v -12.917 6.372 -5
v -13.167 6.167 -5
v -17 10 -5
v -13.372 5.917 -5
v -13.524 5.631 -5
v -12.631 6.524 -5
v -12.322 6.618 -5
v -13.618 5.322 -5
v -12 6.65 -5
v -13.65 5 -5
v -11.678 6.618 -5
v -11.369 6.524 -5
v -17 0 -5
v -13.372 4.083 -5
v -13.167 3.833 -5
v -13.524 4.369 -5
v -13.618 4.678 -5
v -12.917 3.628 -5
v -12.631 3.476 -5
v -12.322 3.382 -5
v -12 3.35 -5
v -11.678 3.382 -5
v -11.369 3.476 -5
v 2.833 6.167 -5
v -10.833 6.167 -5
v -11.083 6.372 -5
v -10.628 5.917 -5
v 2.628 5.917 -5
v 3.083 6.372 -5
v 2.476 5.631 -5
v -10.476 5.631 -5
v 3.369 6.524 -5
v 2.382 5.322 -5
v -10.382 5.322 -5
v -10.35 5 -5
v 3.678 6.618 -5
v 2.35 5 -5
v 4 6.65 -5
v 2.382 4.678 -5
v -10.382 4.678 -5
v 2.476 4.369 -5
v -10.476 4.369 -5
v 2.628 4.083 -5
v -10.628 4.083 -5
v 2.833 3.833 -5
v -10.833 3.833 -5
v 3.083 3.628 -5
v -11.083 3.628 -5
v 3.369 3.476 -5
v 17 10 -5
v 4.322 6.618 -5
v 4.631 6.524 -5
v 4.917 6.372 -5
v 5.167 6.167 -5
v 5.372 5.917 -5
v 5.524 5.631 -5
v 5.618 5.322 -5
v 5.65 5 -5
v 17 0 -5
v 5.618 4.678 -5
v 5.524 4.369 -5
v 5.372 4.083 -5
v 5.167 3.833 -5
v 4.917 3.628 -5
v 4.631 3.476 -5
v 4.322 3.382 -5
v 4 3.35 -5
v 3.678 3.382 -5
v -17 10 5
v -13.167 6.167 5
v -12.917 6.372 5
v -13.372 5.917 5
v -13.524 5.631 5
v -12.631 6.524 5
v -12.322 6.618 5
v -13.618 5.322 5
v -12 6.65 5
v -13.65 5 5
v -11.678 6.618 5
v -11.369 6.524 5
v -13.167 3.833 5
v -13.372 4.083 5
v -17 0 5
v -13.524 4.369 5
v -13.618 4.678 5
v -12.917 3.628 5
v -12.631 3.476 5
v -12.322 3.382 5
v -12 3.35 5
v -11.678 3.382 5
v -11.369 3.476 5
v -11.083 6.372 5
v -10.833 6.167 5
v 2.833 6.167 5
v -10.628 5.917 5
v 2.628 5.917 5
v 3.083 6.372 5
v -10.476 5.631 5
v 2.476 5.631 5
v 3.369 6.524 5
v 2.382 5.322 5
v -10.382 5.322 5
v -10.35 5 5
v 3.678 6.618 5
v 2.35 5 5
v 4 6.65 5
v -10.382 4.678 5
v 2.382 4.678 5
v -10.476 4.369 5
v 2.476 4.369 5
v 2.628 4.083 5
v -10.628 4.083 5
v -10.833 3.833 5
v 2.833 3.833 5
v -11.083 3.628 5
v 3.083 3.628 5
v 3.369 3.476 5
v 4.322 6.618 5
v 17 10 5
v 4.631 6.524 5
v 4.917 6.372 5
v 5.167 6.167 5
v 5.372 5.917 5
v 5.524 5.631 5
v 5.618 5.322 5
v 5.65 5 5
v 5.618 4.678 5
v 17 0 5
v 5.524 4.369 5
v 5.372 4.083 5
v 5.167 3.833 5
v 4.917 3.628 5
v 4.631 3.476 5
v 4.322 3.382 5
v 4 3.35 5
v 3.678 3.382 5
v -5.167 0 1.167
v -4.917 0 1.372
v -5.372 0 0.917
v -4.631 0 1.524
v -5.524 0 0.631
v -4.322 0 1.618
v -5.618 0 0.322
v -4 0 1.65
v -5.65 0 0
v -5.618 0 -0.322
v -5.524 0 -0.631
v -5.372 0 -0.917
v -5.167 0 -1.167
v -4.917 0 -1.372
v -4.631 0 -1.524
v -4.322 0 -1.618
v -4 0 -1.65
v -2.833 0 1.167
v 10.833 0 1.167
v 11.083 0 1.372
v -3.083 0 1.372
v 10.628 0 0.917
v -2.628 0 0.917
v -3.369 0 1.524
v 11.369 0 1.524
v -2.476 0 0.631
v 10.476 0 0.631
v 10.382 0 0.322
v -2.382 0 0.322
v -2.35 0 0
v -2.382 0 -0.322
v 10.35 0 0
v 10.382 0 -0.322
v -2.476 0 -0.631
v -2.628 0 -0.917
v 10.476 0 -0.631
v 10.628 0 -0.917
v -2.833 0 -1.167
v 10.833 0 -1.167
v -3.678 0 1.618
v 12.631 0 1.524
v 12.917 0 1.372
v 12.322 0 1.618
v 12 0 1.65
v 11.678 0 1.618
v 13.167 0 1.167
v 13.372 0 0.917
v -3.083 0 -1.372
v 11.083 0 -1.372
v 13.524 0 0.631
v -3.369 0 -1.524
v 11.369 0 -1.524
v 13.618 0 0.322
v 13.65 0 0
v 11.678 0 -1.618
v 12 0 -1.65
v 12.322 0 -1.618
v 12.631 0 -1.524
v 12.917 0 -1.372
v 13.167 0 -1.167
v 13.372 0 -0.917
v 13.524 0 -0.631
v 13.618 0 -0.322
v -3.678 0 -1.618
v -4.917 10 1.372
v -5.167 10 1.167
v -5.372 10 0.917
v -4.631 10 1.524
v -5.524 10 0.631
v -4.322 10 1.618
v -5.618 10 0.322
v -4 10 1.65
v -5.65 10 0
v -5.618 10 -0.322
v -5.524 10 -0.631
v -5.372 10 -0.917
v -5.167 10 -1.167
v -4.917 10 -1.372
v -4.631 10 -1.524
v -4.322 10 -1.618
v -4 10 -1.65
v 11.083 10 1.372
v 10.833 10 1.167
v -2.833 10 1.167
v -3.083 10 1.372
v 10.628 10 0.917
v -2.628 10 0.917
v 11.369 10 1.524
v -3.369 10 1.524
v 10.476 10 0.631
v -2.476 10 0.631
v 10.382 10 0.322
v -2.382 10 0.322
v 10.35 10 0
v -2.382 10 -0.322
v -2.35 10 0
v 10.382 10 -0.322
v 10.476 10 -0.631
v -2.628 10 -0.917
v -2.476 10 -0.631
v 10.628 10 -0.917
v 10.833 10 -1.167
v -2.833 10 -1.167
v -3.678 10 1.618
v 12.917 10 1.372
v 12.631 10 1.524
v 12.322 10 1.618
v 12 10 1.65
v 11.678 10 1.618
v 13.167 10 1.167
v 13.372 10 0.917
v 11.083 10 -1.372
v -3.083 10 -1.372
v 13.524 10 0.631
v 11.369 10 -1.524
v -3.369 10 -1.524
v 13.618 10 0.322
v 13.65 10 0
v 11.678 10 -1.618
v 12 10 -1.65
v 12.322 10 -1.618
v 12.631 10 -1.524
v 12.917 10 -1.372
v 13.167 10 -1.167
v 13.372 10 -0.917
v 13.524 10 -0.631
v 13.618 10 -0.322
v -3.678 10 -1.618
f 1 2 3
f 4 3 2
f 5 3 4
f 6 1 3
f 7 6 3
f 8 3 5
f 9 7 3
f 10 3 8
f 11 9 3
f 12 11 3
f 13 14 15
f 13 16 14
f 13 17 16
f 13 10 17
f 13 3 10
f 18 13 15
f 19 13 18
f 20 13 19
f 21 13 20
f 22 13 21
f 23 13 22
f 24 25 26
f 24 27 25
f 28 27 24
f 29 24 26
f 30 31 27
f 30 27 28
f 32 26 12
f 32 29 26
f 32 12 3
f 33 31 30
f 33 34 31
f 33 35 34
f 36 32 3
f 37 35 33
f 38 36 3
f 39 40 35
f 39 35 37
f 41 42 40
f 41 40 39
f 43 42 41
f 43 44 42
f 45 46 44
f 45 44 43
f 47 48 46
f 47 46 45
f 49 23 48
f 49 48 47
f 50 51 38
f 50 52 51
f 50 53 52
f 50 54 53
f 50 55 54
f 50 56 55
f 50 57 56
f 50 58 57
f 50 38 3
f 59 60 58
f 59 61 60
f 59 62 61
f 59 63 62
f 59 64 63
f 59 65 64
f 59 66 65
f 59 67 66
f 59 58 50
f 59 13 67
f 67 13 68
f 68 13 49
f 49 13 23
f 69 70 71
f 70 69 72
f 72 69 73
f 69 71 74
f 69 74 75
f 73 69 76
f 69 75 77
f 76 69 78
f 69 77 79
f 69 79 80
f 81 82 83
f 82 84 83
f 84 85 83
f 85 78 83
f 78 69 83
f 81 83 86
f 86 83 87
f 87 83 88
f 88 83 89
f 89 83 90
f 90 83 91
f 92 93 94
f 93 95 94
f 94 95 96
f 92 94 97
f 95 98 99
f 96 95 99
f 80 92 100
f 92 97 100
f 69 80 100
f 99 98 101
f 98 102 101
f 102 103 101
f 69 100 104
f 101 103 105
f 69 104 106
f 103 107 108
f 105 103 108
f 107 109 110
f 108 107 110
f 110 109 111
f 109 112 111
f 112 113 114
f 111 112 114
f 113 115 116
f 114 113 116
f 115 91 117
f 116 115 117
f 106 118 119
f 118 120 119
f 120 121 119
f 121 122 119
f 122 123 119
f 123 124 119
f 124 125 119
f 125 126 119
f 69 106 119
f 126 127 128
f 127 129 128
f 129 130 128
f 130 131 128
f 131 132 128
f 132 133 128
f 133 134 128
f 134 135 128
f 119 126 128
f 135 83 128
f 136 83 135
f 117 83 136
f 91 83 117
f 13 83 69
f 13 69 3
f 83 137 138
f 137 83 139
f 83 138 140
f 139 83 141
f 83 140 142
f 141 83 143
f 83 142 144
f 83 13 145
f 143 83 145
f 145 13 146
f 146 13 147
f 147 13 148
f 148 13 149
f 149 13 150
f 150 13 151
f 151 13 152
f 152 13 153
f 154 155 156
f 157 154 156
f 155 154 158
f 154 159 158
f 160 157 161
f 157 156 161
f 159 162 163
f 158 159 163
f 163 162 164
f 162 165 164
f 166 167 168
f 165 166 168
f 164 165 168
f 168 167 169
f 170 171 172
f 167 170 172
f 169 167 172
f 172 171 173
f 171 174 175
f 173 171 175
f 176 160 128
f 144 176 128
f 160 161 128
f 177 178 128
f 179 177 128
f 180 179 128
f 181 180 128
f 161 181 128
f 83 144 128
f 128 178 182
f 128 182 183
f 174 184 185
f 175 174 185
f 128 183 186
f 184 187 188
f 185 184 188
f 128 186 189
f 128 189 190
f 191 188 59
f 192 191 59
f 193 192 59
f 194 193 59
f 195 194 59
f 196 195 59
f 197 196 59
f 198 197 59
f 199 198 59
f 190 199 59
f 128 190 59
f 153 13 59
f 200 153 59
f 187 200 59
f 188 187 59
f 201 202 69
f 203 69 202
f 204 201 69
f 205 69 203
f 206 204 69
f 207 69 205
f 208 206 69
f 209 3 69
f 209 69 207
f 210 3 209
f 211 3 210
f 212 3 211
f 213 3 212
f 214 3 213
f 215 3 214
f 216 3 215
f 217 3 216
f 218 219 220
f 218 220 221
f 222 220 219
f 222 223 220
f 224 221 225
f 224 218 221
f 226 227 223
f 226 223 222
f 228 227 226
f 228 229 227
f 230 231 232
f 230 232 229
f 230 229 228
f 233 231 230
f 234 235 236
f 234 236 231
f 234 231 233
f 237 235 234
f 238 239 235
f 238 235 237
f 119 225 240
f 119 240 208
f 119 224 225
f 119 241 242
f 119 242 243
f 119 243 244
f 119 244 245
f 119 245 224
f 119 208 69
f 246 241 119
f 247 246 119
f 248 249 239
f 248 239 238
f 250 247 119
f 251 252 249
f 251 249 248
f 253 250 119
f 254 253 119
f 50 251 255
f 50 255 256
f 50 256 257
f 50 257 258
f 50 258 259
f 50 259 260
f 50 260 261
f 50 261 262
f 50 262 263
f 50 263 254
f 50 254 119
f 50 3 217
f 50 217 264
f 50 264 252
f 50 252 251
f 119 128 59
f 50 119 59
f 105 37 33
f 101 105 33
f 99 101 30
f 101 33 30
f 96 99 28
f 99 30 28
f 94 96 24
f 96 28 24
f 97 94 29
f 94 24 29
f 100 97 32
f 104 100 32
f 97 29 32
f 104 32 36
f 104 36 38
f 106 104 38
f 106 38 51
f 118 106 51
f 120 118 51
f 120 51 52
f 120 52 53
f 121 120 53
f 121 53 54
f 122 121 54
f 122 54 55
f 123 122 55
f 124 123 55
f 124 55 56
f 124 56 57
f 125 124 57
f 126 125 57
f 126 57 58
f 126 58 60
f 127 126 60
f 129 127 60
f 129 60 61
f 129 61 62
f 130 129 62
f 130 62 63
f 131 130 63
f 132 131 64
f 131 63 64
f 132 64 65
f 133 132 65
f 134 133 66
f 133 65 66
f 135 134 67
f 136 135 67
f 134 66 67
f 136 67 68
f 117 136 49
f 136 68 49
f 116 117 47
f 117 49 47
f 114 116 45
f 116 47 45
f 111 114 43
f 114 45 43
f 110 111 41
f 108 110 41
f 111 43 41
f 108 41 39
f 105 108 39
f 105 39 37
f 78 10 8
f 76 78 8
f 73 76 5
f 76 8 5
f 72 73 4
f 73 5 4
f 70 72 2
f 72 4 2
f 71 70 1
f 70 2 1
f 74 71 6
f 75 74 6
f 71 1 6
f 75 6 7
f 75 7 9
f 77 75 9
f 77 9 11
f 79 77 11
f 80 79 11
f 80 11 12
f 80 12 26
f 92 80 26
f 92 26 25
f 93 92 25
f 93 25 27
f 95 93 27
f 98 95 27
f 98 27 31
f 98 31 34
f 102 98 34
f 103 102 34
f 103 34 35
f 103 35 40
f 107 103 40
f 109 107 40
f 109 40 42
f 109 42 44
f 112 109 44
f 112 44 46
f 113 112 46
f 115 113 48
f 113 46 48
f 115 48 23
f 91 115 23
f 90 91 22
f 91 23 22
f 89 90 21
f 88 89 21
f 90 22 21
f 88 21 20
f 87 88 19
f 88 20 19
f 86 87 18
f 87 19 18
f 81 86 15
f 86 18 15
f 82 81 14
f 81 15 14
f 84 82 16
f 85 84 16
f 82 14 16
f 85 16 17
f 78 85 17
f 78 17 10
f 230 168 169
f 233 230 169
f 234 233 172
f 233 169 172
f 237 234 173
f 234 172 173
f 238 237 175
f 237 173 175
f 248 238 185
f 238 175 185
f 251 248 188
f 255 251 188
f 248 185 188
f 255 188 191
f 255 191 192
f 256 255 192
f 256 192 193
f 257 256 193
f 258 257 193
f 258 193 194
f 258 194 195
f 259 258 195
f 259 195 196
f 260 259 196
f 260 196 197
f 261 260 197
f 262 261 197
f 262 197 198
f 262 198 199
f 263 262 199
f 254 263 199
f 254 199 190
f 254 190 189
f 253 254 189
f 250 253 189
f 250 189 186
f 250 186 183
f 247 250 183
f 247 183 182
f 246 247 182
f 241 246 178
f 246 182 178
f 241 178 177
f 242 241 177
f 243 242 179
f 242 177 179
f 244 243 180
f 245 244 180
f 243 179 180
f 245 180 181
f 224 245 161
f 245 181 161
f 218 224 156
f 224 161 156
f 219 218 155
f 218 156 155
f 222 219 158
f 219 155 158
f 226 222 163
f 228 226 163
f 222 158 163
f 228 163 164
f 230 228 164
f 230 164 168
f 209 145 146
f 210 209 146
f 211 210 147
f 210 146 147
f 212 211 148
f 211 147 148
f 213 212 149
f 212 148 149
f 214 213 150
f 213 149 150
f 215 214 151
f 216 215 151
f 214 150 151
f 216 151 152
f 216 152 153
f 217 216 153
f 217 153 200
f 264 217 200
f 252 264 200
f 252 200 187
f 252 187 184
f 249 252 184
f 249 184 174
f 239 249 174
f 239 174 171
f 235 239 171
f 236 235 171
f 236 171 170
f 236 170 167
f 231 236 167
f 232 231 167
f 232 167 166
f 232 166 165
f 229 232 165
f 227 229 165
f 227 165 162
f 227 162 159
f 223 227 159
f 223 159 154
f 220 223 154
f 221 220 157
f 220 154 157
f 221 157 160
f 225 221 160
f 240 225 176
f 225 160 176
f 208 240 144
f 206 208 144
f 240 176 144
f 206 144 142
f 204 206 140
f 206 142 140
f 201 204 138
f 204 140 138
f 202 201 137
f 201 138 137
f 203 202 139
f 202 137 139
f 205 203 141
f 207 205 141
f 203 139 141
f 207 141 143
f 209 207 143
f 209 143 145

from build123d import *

# Parameters (mm, degrees)
SKETCH_1_W         = 34
SKETCH_1_H         = 10
EXTRUDE_1_DEPTH    = 10
HOLE_WIZARD_M4_1_D = 3.3
HOLE_WIZARD_M4_3_D = 3.3


with BuildPart() as part:
    # 草图1 → 凸台-拉伸1 (new body)
    with BuildSketch(Plane(origin=(0, 0, 0), x_dir=(1, 0, 0), z_dir=(0, 1, 0))):
        Rectangle(SKETCH_1_W, SKETCH_1_H)
    extrude(amount=EXTRUDE_1_DEPTH)

    # M4 螺纹孔1 (through all)
    with Locations(Plane.XY.offset(5)):
        with Locations((4, 5), (-12, 5)):
            Hole(HOLE_WIZARD_M4_1_D / 2)

    # M4 螺纹孔3 (through all)
    with Locations(Plane(origin=(0, 10, 0), x_dir=(1, 0, 0), z_dir=(0, 1, 0))):
        with Locations((-4, 0), (12, 0)):
            Hole(HOLE_WIZARD_M4_3_D / 2)


solid = part.part
